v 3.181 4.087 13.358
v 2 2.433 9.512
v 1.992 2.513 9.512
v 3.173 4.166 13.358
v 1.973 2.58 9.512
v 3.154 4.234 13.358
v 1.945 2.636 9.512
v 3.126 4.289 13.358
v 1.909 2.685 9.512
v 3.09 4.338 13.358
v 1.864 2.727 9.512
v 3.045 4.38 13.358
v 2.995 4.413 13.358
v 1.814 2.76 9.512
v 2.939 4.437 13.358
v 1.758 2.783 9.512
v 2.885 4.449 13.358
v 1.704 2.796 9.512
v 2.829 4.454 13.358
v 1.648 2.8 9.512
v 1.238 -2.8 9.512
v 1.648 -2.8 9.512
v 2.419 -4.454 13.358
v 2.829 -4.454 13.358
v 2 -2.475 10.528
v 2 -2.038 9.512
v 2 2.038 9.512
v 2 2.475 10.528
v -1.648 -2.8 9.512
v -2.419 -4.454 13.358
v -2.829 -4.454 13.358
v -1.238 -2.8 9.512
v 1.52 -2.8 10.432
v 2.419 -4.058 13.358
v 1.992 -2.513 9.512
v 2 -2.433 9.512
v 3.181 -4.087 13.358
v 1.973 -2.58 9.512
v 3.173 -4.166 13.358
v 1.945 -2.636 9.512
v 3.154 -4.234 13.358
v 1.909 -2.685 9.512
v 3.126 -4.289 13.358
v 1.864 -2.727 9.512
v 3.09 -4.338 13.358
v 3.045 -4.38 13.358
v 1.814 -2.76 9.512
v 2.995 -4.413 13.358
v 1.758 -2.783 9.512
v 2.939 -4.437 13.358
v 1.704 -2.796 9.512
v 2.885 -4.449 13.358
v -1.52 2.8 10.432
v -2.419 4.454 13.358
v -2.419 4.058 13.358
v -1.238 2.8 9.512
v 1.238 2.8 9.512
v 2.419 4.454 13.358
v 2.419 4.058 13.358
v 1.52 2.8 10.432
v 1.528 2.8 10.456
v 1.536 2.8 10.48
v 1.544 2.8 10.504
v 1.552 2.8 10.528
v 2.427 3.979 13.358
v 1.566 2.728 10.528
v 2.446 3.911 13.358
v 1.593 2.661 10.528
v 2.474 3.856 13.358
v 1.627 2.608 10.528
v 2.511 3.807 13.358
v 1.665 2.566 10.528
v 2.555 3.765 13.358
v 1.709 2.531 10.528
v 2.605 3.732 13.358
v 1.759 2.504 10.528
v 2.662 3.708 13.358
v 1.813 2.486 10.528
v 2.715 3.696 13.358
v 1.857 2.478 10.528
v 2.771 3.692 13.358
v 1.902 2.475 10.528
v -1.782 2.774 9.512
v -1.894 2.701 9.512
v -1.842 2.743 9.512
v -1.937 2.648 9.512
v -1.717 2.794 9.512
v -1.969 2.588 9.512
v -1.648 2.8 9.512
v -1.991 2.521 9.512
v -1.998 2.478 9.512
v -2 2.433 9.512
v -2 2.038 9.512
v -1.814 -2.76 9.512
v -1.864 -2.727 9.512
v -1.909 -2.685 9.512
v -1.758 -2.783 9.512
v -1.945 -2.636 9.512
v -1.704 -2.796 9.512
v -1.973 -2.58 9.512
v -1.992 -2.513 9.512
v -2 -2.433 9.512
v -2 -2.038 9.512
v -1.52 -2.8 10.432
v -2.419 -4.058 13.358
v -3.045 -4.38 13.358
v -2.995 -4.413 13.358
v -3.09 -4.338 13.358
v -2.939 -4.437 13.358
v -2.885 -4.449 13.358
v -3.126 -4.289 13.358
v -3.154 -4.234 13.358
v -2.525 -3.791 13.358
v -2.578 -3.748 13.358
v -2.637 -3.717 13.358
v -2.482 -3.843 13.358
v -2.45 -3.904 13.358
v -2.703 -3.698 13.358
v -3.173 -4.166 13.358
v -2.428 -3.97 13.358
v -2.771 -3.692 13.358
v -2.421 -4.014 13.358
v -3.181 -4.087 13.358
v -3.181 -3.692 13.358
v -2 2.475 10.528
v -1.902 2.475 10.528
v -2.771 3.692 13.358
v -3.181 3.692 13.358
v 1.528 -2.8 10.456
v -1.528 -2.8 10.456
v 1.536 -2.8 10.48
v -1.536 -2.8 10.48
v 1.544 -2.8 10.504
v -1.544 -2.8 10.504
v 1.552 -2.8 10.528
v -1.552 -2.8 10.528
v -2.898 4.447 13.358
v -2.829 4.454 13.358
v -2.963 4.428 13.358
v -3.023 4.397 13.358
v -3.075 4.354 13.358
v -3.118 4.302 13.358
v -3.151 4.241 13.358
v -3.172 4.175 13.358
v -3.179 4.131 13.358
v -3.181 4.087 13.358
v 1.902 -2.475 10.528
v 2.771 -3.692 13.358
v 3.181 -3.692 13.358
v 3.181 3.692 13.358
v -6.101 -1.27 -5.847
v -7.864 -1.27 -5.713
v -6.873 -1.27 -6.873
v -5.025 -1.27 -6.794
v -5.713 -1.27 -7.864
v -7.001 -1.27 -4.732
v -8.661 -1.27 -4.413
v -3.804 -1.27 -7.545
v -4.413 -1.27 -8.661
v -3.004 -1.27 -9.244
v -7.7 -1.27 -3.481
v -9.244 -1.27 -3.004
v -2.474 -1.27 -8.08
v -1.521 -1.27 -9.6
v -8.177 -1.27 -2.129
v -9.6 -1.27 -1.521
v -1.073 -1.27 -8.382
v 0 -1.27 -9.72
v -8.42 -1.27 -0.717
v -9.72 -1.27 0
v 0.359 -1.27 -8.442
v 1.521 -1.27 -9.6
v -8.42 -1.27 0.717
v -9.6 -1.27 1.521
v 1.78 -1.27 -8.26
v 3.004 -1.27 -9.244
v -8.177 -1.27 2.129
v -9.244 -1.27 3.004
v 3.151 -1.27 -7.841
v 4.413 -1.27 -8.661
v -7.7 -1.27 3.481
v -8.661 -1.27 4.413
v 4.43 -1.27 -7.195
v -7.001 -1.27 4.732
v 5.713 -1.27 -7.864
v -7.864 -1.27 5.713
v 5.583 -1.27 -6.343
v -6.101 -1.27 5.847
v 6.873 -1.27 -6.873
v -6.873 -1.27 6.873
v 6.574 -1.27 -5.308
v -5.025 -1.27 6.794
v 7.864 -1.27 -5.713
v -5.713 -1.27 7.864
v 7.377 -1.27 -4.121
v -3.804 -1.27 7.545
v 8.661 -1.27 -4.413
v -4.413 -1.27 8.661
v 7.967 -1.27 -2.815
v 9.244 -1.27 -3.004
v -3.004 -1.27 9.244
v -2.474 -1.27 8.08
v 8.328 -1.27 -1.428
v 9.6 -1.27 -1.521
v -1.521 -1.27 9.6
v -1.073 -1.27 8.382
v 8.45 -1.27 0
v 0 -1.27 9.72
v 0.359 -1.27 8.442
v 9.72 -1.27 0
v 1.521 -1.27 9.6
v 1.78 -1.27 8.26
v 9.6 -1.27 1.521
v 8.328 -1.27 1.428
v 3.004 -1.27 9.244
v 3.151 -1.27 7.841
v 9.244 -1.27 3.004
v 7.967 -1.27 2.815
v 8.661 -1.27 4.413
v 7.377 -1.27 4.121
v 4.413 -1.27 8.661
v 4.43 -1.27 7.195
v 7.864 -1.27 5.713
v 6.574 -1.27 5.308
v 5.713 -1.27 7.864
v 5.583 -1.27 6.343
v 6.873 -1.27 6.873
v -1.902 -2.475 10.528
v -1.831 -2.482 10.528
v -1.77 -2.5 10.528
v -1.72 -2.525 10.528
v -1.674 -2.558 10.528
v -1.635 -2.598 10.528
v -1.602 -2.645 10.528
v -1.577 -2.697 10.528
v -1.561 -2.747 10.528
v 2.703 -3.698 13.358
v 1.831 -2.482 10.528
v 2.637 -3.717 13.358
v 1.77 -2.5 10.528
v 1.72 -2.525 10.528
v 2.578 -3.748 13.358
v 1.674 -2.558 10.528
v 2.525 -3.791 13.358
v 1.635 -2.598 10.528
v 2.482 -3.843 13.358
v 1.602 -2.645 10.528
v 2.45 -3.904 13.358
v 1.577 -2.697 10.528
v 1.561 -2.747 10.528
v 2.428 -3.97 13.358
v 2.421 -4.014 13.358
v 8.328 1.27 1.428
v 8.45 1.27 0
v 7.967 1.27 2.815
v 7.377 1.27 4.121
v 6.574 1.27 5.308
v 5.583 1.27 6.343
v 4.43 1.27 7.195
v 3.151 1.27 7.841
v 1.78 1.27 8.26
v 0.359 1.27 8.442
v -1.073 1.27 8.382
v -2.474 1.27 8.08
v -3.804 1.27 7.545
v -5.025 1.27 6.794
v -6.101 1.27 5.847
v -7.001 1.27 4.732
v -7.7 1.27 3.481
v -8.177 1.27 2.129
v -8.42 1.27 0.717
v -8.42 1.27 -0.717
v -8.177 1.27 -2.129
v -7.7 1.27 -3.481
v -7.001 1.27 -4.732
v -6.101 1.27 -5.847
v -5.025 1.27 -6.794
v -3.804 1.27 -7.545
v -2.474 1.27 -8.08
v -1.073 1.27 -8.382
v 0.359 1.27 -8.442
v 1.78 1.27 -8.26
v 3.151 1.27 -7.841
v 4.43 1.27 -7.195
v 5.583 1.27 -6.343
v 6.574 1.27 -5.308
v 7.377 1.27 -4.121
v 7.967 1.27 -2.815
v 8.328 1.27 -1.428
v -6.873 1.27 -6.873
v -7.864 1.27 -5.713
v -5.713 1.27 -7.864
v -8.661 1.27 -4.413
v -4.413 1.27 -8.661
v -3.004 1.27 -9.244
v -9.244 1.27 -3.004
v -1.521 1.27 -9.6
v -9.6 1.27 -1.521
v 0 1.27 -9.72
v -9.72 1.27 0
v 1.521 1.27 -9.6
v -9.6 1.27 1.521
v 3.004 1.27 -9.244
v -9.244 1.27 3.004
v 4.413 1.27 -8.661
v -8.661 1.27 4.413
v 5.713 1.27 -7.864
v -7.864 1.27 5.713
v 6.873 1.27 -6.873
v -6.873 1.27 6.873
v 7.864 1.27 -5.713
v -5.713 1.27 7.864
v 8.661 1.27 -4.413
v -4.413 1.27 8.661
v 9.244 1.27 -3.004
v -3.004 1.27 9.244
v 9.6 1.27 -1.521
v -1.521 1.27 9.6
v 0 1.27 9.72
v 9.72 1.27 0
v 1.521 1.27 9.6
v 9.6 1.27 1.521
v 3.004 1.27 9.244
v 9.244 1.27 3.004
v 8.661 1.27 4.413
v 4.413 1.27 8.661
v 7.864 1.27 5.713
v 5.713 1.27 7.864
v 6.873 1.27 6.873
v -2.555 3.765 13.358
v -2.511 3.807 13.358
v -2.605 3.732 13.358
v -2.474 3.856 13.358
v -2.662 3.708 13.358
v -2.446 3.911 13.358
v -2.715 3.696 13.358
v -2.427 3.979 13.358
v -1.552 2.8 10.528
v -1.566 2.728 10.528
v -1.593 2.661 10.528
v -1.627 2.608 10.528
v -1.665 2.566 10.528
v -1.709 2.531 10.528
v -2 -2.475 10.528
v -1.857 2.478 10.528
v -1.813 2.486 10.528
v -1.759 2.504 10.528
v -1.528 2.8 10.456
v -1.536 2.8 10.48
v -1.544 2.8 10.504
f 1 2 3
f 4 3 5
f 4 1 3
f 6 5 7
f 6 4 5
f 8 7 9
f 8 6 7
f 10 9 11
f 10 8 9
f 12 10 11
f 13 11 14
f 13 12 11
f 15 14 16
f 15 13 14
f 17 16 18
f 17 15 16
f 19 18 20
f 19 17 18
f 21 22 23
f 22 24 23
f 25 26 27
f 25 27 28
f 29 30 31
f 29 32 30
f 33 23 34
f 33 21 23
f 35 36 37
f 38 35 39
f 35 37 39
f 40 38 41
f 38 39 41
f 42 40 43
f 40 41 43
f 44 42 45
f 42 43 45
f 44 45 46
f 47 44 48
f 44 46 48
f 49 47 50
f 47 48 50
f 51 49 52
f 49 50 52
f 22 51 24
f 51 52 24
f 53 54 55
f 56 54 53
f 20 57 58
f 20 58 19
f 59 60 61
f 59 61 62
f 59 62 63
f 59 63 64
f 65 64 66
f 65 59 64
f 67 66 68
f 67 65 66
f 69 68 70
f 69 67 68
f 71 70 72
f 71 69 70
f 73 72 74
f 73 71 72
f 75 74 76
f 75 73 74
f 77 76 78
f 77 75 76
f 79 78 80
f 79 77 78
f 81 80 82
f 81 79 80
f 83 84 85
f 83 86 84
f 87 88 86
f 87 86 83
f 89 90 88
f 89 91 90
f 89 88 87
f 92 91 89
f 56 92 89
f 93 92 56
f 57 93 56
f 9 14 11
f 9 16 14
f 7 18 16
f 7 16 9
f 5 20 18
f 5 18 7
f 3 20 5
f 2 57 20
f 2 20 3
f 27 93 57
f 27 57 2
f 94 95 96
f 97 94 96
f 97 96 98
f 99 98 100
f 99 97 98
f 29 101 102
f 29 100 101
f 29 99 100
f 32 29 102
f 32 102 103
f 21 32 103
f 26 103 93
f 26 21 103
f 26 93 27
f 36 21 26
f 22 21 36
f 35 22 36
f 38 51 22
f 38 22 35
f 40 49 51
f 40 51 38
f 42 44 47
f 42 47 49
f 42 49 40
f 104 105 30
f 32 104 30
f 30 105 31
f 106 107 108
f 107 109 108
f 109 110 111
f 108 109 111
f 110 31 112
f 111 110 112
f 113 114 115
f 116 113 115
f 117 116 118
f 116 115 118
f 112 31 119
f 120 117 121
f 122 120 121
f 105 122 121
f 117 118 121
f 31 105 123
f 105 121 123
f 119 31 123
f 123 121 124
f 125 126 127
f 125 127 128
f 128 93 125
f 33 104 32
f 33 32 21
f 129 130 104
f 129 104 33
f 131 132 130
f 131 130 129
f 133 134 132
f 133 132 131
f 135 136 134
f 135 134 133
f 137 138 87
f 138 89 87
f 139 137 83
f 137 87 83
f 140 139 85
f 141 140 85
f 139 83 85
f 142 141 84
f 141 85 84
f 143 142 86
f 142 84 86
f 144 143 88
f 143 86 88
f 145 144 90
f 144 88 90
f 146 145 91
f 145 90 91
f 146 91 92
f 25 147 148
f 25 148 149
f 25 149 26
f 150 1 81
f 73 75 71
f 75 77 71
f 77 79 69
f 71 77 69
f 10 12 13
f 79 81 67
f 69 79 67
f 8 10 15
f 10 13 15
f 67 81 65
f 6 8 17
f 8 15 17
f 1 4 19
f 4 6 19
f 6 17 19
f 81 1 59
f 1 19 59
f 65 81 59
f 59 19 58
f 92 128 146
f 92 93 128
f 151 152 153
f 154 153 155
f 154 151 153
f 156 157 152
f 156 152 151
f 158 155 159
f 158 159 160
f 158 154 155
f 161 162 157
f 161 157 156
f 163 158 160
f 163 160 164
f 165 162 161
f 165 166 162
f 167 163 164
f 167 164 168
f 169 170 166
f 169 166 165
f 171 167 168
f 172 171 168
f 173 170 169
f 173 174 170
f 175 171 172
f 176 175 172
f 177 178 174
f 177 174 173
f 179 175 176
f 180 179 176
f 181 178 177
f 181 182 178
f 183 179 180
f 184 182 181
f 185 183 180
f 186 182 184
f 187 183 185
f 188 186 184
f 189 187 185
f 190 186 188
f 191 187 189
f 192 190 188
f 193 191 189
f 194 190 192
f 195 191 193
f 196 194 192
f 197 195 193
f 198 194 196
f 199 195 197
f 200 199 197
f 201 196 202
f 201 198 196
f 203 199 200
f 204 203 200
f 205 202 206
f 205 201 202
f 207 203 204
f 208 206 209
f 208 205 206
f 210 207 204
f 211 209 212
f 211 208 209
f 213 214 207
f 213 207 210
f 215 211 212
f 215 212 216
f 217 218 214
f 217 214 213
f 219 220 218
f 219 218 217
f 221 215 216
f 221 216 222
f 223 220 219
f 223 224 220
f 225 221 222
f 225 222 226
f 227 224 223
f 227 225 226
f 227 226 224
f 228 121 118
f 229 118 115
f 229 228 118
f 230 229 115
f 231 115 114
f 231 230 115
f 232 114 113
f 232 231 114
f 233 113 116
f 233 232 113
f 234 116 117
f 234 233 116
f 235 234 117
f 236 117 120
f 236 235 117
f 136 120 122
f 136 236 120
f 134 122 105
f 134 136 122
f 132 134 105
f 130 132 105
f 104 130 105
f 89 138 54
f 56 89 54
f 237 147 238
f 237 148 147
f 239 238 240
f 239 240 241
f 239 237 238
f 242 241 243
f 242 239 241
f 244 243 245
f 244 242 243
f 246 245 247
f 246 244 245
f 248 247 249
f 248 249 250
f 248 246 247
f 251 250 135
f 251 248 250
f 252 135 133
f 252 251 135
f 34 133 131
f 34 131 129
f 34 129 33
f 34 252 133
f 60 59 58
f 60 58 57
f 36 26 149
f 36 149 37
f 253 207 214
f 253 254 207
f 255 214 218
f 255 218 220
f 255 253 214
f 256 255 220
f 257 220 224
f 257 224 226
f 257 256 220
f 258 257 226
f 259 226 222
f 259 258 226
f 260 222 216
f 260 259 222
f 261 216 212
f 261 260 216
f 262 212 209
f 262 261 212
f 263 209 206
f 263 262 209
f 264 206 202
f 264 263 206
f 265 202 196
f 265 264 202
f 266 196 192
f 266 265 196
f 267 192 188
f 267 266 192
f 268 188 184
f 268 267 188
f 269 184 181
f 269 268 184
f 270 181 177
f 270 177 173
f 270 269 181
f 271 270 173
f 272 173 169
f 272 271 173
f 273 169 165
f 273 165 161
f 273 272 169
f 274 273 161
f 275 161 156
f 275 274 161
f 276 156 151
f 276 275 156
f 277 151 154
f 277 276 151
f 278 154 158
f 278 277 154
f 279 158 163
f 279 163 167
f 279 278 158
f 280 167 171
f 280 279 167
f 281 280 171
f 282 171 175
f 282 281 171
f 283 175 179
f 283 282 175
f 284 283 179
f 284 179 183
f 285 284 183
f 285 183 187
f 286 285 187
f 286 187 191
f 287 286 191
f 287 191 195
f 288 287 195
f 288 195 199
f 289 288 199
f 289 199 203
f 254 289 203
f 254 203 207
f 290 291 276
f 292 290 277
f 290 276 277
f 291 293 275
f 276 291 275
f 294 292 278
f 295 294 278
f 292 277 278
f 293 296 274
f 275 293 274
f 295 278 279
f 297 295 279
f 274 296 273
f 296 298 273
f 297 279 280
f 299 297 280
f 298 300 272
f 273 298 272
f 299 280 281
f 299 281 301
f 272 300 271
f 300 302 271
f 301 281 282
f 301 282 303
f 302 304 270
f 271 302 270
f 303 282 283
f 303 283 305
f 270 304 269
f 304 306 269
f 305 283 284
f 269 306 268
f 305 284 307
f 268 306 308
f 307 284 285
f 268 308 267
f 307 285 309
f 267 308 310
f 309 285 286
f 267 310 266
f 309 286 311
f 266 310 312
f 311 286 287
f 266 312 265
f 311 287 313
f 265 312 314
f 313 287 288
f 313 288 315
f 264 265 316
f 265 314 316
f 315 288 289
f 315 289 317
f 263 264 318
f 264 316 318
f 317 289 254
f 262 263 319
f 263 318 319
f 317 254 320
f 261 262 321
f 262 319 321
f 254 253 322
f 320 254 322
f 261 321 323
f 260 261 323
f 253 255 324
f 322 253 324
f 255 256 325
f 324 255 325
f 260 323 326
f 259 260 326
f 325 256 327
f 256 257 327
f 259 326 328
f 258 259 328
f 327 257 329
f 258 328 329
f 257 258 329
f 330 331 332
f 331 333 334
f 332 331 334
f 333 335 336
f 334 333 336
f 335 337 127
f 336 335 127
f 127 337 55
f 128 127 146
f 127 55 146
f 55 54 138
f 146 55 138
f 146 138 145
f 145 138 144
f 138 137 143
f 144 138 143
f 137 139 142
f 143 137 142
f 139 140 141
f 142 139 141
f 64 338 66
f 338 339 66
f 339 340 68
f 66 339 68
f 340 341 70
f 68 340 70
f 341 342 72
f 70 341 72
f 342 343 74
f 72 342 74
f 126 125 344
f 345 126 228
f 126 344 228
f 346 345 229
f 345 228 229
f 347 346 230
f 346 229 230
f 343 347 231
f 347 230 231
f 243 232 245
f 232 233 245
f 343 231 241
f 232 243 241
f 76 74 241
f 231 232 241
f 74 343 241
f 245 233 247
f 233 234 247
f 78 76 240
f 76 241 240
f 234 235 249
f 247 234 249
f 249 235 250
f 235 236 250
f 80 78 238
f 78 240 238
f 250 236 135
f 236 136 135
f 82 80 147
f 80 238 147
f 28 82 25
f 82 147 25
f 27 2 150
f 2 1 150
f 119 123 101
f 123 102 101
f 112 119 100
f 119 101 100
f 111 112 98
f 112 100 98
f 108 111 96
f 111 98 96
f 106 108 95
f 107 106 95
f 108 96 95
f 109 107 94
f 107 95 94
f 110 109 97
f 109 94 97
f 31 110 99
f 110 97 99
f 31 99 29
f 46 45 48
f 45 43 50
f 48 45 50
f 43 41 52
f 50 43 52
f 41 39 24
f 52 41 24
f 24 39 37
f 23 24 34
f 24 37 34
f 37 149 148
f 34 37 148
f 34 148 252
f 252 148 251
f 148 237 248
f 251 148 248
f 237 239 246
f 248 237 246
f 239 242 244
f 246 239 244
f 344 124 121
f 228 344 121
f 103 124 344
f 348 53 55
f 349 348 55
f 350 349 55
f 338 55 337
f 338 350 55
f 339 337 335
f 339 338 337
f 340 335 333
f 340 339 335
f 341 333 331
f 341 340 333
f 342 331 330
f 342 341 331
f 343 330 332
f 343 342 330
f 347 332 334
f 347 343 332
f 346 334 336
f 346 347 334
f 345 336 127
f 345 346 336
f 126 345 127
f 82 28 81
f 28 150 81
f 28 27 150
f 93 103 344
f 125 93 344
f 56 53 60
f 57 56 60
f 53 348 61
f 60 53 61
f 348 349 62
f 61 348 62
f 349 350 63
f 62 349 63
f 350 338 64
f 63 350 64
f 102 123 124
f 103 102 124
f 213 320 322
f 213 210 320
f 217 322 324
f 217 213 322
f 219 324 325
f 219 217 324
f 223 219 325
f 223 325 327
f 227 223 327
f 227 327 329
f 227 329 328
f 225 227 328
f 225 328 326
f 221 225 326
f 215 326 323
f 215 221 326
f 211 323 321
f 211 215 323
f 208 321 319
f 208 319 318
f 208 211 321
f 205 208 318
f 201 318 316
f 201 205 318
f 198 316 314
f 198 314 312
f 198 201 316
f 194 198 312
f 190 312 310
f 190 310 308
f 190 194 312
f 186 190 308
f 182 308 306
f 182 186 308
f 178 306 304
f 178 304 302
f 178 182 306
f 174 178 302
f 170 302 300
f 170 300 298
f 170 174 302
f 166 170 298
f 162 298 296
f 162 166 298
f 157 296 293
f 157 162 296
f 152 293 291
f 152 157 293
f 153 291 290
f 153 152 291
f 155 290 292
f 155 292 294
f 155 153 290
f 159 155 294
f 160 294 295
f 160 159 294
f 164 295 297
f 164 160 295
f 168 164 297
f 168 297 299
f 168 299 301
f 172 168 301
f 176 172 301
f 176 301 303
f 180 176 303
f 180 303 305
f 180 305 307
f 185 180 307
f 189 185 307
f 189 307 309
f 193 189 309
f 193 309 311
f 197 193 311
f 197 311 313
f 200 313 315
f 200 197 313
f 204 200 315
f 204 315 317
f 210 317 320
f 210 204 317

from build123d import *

# Parameters (mm, degrees)
F0_R     = 9.72
F0_R_2   = 8.45
F1_DEPTH = 1.27
F2_W     = 4
F2_H     = 1.016
F3_DEPTH = 2.8
F5_W     = 0.762
F5_H     = 0.762
F9_W     = 0.762
F9_H     = 0.762
F10_W    = 0.762
F10_H    = 0.762
F8_W     = 0.762
F8_H     = 0.762
F18_R    = 0.381


with BuildPart() as f1:
    # F0 (on Front) → F1 (new body, symmetric)
    with BuildSketch(Plane.XZ):
        Circle(F0_R)
        Circle(F0_R_2, mode=Mode.SUBTRACT)
    extrude(amount=F1_DEPTH, both=True)


with BuildPart() as f3:
    # F2 (on Front) → F3 (new body, symmetric)
    with BuildSketch(Plane.XZ):
        with Locations((0, 10.0200134567)):
            Rectangle(F2_W, F2_H)
    extrude(amount=F3_DEPTH, both=True)

    # F7: sweep along a path in F6
    with BuildLine(Plane(origin=(0, 0, 0), x_dir=(-0.5812381937, -0.8137334712, 0), z_dir=(-0.8137334712, 0.5812381937, 0))) as f7_path:
        Line((-3.4409301068, 9.5120134567), (-5.4729301068, 13.3580134567))
    # F5 (on face) → F7 (sweep)
    with BuildSketch(Plane(origin=(0, 0, 9.5120134567), x_dir=(1, 0, 0), z_dir=(0, 0, -1))):
        with Locations((1.619, -2.419)):
            Rectangle(F5_W, F5_H)
    sweep(path=f7_path.line)

    # F12: sweep along a path in F11
    with BuildLine(Plane(origin=(0, 0, 0), x_dir=(-0.5812381937, -0.8137334712, 0), z_dir=(-0.8137334712, 0.5812381937, 0))) as f12_path:
        Line((5.4729301068, 13.3580134567), (3.4409301068, 9.5120134567))
    # F9 (on face) → F12 (sweep)
    with BuildSketch(Plane(origin=(0, 0, 9.5120134567), x_dir=(1, 0, 0), z_dir=(0, 0, -1))):
        with Locations((-1.619, 2.419)):
            Rectangle(F9_W, F9_H)
    sweep(path=f12_path.line)

    # F15: sweep along a path in F14
    with BuildLine(Plane(origin=(0, 0, 0), x_dir=(0.5812381937, -0.8137334712, 0), z_dir=(-0.8137334712, -0.5812381937, 0))) as f15_path:
        Line((3.4409301068, 9.5120134567), (5.4729301068, 13.3580134567))
    # F10 (on face) → F15 (sweep)
    with BuildSketch(Plane(origin=(0, 0, 9.5120134567), x_dir=(1, 0, 0), z_dir=(0, 0, -1))):
        with Locations((1.619, 2.419)):
            Rectangle(F10_W, F10_H)
    sweep(path=f15_path.line)

    # F17: sweep along a path in F16
    with BuildLine(Plane(origin=(0, 0, 0), x_dir=(0.5812381937, -0.8137334712, 0), z_dir=(-0.8137334712, -0.5812381937, 0))) as f17_path:
        Line((-5.4729301068, 13.3580134567), (-3.4409301068, 9.5120134567))
    # F8 (on face) → F17 (sweep)
    with BuildSketch(Plane(origin=(0, 0, 9.5120134567), x_dir=(1, 0, 0), z_dir=(0, 0, -1))):
        with Locations((-1.619, -2.419)):
            Rectangle(F8_W, F8_H)
    sweep(path=f17_path.line)

    # F18 (call 1 of 8: OpenCascade refuses the feature's edges together)
    f18_edges = [f3.edges().sort_by_distance(p)[0] for p in [
        (-1.984541, -3.083157, 11.943013),
    ]]
    fillet(f18_edges, radius=F18_R)

    # F18#2 (call 2 of 8)
    f18_2_edges = [f3.edges().sort_by_distance(p)[0] for p in [
        (1.984541, 3.083157, 11.943013),
    ]]
    fillet(f18_2_edges, radius=F18_R)

    # F18#3 (call 3 of 8)
    f18_3_edges = [f3.edges().sort_by_distance(p)[0] for p in [
        (-2.590538, -3.626753, 11.435013),
    ]]
    fillet(f18_3_edges, radius=F18_R)

    # F18#4 (call 4 of 8)
    f18_4_edges = [f3.edges().sort_by_distance(p)[0] for p in [
        (2.590538, 3.626753, 11.435013),
    ]]
    fillet(f18_4_edges, radius=F18_R)

    # F18#5 (call 5 of 8)
    f18_5_edges = [f3.edges().sort_by_distance(p)[0] for p in [
        (-2.590538, 3.626753, 11.435013),
    ]]
    fillet(f18_5_edges, radius=F18_R)

    # F18#6 (call 6 of 8)
    f18_6_edges = [f3.edges().sort_by_distance(p)[0] for p in [
        (1.984541, -3.083157, 11.943013),
    ]]
    fillet(f18_6_edges, radius=F18_R)

    # F18#7 (call 7 of 8)
    f18_7_edges = [f3.edges().sort_by_distance(p)[0] for p in [
        (-1.984541, 3.083157, 11.943013),
    ]]
    fillet(f18_7_edges, radius=F18_R)

    # F18#8 (call 8 of 8)
    f18_8_edges = [f3.edges().sort_by_distance(p)[0] for p in [
        (2.590538, -3.626753, 11.435013),
    ]]
    fillet(f18_8_edges, radius=F18_R)


solid = Compound([f1.part, f3.part])
